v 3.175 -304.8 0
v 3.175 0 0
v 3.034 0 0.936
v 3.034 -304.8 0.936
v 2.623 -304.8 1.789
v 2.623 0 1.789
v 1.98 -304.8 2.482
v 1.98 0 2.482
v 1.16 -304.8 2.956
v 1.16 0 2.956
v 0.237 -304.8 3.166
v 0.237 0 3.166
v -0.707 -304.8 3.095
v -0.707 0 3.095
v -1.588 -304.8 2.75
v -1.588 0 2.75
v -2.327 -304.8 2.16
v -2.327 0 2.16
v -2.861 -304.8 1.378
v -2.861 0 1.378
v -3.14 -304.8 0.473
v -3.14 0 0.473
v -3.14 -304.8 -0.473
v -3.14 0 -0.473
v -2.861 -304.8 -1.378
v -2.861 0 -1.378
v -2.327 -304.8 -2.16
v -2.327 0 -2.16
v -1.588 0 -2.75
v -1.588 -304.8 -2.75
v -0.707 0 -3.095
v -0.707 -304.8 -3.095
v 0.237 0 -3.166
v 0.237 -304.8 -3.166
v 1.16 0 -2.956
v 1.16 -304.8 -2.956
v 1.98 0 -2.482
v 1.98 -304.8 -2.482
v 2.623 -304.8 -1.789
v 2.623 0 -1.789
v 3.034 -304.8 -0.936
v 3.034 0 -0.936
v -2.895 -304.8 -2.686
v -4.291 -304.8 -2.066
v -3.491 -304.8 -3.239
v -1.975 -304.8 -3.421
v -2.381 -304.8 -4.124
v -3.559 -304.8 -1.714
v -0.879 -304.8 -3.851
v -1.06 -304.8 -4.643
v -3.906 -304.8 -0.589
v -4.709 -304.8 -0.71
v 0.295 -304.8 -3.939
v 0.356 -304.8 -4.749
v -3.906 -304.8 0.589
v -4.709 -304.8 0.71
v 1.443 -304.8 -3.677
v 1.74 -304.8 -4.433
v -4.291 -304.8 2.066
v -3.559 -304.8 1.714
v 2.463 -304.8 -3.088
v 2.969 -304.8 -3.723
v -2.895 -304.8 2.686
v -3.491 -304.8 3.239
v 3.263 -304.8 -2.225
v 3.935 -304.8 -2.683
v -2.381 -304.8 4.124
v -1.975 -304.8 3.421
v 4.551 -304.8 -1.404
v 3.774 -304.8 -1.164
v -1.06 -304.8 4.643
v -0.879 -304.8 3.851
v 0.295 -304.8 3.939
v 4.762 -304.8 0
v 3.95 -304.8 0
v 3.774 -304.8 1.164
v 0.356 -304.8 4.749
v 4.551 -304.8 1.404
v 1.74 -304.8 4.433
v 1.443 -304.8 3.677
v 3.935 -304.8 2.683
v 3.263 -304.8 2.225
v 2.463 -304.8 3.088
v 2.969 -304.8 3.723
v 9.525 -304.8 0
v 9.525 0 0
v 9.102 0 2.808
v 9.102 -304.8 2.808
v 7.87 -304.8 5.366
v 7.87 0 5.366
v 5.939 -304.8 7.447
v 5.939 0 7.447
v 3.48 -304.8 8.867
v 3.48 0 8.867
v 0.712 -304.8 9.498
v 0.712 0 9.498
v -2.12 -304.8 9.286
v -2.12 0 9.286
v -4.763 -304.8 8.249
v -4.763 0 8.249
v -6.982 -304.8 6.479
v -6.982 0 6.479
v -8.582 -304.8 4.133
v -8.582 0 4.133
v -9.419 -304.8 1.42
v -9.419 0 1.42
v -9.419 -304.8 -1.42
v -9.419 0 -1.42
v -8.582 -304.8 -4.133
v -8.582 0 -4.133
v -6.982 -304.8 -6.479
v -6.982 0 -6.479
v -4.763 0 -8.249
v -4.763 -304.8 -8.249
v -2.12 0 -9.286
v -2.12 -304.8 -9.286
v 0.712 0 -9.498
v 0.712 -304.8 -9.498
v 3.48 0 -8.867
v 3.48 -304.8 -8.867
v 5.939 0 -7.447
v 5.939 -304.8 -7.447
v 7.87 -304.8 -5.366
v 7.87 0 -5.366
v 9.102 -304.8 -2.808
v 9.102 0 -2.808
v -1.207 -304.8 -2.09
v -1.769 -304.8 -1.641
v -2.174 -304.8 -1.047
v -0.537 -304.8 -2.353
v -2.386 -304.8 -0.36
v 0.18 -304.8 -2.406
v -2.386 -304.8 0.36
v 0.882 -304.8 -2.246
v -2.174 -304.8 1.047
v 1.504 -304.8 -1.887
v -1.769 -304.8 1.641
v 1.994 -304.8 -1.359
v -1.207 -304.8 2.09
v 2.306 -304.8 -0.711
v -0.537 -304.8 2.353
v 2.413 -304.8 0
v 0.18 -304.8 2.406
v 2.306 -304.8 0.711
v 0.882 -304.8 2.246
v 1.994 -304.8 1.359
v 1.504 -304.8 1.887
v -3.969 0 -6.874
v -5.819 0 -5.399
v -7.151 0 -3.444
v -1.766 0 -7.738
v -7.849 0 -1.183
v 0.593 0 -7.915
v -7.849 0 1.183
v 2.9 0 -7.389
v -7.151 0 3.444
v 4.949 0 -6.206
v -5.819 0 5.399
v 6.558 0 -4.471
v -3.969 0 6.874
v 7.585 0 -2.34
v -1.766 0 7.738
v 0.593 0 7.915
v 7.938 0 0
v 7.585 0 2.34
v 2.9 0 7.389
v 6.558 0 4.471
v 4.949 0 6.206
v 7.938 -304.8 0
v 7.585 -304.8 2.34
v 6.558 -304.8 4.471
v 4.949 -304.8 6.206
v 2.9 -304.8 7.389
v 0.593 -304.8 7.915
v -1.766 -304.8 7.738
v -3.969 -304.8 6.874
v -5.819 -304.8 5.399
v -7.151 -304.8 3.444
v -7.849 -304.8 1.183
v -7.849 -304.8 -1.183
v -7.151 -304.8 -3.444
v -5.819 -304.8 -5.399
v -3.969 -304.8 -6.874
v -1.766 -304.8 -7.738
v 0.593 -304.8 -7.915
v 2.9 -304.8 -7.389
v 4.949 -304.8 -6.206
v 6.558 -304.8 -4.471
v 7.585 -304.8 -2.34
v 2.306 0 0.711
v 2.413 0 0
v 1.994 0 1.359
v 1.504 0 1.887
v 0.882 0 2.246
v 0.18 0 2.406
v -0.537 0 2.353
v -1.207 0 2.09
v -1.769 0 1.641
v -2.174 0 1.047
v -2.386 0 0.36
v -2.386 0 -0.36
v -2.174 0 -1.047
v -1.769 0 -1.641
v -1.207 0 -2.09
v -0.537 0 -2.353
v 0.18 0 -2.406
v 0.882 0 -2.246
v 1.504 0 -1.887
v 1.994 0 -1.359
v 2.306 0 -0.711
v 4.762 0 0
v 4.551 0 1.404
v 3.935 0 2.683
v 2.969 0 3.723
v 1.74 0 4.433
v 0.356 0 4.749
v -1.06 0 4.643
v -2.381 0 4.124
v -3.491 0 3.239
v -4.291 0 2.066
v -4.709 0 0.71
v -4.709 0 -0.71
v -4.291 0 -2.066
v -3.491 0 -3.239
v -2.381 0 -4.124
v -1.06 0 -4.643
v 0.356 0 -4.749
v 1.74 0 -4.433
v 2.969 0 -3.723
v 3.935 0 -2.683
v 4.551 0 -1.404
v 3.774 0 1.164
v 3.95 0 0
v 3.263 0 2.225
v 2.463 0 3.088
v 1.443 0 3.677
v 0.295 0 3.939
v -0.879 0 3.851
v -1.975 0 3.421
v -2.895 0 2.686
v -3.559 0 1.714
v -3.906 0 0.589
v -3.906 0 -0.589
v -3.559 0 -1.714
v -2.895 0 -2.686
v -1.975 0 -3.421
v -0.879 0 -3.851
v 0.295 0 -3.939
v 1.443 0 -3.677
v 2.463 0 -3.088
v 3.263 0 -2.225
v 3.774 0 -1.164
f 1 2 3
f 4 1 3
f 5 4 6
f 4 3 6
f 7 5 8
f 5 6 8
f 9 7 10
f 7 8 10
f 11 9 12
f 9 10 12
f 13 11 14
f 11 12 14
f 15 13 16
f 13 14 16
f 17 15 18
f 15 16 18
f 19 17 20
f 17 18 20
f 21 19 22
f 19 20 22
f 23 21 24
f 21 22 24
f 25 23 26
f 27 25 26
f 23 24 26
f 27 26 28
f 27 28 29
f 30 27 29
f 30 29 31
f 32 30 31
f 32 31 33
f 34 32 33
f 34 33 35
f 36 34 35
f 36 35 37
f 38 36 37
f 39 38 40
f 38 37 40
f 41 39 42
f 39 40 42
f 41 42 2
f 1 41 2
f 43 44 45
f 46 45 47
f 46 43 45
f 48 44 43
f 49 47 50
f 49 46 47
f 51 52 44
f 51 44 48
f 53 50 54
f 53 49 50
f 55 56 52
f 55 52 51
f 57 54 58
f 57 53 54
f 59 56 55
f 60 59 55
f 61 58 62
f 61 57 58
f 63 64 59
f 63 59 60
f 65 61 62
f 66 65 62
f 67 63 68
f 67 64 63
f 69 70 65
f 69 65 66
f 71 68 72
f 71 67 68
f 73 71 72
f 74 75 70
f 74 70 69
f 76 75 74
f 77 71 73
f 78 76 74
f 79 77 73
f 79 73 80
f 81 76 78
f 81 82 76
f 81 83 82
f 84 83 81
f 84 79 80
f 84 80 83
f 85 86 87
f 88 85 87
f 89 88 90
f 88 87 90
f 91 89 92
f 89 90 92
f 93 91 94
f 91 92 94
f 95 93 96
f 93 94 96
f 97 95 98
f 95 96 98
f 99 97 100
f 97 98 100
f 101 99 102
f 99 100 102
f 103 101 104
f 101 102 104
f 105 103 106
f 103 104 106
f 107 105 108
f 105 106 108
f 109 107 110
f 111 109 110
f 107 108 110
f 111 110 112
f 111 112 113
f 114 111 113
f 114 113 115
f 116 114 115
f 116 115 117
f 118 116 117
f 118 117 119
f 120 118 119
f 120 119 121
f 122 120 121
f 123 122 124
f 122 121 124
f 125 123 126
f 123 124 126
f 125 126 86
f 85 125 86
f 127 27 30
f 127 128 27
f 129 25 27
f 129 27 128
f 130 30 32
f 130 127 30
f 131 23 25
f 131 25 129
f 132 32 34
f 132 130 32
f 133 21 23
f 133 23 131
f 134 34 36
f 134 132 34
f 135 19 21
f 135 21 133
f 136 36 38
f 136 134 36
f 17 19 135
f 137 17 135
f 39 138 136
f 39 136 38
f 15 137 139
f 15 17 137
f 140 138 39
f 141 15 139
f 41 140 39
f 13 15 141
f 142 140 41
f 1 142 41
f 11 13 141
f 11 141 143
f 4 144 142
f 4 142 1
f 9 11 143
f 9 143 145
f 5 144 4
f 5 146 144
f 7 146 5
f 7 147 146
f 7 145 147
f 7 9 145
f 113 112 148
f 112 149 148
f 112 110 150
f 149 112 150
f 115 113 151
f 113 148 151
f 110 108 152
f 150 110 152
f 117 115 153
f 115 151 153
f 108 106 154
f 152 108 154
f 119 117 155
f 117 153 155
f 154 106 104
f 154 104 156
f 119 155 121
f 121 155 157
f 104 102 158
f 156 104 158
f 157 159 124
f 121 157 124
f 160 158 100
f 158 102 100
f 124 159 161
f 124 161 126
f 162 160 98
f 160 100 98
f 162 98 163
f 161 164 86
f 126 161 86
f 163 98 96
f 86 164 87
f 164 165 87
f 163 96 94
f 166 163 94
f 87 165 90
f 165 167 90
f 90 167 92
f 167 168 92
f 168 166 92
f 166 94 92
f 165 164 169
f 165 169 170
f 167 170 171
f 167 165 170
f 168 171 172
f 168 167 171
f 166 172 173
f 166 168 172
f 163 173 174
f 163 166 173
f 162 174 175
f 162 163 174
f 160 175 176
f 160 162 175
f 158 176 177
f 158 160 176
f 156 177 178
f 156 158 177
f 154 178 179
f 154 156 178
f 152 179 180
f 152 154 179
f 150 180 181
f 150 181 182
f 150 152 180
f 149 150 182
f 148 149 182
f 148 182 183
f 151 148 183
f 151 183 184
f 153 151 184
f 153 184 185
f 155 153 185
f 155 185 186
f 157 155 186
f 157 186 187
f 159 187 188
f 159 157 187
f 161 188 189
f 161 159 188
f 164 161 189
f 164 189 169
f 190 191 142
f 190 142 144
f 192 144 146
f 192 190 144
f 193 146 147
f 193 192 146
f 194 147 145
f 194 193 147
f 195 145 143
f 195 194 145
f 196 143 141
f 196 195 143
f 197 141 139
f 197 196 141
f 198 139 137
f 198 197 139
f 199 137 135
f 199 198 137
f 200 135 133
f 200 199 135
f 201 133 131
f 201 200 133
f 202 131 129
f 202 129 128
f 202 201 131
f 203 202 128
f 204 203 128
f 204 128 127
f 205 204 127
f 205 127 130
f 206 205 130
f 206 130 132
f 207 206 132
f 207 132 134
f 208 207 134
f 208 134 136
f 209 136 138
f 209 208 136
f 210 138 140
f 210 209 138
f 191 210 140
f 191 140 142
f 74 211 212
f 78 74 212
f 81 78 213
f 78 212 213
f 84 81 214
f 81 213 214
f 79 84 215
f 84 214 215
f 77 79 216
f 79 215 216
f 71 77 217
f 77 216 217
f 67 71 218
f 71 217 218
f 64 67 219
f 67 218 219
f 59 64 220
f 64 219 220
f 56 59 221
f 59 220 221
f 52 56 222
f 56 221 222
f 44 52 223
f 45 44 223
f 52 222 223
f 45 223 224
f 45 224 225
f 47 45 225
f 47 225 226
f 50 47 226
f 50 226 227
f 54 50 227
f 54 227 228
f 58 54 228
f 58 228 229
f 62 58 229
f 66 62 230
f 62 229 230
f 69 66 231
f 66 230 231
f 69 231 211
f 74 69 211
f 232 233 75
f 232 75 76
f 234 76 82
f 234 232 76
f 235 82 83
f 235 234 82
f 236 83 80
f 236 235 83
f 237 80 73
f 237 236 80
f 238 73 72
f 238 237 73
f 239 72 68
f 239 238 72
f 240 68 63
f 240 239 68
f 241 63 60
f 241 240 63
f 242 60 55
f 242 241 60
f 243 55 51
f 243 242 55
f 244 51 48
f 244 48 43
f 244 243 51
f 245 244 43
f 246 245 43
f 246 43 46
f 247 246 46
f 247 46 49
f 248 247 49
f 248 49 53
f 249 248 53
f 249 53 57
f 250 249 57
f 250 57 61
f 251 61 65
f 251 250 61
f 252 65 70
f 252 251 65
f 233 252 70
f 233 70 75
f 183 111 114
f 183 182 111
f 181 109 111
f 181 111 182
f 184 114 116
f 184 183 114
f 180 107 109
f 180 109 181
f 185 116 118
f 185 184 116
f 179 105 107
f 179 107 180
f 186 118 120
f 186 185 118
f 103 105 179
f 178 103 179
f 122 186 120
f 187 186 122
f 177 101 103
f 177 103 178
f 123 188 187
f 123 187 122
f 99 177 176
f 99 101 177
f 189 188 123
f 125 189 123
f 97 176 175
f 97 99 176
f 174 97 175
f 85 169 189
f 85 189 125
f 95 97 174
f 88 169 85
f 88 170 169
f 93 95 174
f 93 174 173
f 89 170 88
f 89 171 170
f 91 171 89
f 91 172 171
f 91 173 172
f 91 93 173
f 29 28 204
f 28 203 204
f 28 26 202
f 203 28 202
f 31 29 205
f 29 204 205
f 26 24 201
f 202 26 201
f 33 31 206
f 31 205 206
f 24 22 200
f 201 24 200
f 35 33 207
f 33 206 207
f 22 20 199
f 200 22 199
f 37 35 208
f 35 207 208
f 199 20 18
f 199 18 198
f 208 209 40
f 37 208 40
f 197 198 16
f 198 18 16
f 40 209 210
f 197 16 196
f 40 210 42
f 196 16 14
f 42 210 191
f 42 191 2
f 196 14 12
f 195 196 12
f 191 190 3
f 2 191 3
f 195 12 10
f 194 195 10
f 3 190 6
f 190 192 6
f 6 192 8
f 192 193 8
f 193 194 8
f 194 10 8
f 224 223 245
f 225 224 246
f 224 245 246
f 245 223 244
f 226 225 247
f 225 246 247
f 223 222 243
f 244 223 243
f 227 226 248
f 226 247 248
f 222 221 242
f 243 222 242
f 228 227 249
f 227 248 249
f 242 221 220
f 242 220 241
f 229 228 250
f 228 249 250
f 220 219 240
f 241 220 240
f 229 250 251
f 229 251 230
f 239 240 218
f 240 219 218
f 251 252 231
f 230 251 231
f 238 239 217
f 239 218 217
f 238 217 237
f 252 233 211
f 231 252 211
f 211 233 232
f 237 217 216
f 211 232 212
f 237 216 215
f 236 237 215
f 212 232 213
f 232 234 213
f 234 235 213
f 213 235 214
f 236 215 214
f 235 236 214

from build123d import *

# Parameters (mm, degrees)
F0_R     = 3.175
F0_R_2   = 2.413
F1_DEPTH = 304.8
F0_R_3   = 4.7625
F0_R_4   = 3.9497
F0_R_5   = 9.525
F0_R_6   = 7.9375


with BuildPart() as f1:
    # F0 (on Front) → F1 (new body)
    with BuildSketch(Plane.XZ):
        Circle(F0_R)
        Circle(F0_R_2, mode=Mode.SUBTRACT)
    extrude(amount=F1_DEPTH)


with BuildPart() as f1b:
    # F0 (on Front) → F1, piece 2 (new body)
    with BuildSketch(Plane.XZ):
        Circle(F0_R_3)
        Circle(F0_R_4, mode=Mode.SUBTRACT)
    extrude(amount=F1_DEPTH)


with BuildPart() as f1c:
    # F0 (on Front) → F1, piece 3 (new body)
    with BuildSketch(Plane.XZ):
        Circle(F0_R_5)
        Circle(F0_R_6, mode=Mode.SUBTRACT)
    extrude(amount=F1_DEPTH)


solid = Compound([f1.part, f1b.part, f1c.part])
